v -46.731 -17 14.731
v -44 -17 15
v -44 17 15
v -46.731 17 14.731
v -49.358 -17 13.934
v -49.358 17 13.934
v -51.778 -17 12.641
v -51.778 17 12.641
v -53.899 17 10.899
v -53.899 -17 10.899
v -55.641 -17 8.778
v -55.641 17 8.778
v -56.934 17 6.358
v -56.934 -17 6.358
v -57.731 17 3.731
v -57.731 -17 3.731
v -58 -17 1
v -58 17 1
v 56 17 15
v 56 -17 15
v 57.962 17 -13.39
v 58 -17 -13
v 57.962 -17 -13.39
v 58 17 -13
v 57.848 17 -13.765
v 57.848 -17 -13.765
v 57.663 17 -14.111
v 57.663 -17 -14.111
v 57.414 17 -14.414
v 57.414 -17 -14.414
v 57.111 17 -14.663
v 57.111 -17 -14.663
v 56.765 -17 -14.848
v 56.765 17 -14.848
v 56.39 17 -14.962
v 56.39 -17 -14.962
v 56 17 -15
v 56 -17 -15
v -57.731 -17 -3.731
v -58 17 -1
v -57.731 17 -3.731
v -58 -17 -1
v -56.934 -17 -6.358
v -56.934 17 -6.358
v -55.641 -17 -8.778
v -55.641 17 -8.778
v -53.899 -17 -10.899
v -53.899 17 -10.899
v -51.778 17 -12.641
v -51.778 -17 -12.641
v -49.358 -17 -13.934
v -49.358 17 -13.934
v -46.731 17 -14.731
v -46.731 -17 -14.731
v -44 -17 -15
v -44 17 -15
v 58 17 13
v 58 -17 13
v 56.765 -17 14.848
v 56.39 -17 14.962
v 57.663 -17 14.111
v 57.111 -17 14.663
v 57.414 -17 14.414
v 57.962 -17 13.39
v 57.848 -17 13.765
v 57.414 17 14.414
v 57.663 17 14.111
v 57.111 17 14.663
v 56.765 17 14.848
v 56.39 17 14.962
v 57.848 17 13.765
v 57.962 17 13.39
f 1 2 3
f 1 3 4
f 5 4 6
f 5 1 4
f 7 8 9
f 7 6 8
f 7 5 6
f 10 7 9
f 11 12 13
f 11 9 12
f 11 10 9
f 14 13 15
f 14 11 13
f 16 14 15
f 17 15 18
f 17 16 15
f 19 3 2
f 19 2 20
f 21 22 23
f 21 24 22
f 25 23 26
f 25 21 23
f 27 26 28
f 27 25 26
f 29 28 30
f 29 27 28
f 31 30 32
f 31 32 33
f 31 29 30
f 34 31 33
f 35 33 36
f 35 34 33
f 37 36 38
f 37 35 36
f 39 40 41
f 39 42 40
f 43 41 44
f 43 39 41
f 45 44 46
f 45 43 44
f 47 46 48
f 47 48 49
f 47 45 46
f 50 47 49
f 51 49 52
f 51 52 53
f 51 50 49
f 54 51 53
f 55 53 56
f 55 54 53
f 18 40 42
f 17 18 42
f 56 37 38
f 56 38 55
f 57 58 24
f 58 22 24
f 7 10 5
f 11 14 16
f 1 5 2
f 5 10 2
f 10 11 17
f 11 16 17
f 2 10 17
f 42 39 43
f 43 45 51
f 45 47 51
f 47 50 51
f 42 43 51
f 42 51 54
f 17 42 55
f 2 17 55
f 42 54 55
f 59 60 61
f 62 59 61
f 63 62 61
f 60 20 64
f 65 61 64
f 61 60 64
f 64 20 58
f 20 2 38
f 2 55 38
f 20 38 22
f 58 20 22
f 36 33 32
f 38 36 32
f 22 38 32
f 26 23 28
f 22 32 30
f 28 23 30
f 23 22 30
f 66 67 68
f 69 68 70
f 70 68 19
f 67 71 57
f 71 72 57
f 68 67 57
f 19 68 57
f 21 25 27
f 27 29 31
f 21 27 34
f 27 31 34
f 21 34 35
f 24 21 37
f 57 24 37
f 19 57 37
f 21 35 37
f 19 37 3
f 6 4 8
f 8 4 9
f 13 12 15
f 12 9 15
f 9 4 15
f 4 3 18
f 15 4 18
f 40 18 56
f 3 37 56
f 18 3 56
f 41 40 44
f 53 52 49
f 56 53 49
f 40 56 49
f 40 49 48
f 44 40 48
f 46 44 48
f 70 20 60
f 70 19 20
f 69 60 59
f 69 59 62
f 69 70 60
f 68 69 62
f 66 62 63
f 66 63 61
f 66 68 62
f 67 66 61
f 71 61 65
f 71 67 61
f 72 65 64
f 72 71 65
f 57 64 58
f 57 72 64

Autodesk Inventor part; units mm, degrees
ref_plane "YZ Plane" through (0, 0, 0) normal (1, 0, 0) x (0, 1, 0)
ref_plane "XZ Plane" through (0, 0, 0) normal (0, 1, 0) x (-1, 0, 0)
ref_plane "XY Plane" through (0, 0, 0) normal (0, 0, 1) x (1, 0, 0)
sketch "スケッチ1" plane through (0, 0, 0) normal (0, 0, 1) x (1, 0, 0)
  line L0 (-58, -17) -> (58, -17)
  line L1 (58, -17) -> (58, 17)
  line L2 (58, 17) -> (-58, 17)
  line L3 (-58, 17) -> (-58, -17)
  line L4 (-58, -17) -> (58, 17) construction
  line L5 (58, -17) -> (-58, 17) construction
  point P0 (0, 0)
  dimension "d0" = 116
  dimension "d1" = 34
extrude "押し出し1" add sketch "スケッチ1" along normal blind 15
mirror "ミラー1" about plane through (0, 0, 0) normal (0, 0, -1) of "押し出し1"
fillet "フィレット1" radius 14 2 edges at (-58, 0, 15) (-58, 0, -15)
fillet "フィレット2" radius 2 2 edges at (58, 0, 15) (58, 0, -15)
properties part number "HP-G570-2600S3"
